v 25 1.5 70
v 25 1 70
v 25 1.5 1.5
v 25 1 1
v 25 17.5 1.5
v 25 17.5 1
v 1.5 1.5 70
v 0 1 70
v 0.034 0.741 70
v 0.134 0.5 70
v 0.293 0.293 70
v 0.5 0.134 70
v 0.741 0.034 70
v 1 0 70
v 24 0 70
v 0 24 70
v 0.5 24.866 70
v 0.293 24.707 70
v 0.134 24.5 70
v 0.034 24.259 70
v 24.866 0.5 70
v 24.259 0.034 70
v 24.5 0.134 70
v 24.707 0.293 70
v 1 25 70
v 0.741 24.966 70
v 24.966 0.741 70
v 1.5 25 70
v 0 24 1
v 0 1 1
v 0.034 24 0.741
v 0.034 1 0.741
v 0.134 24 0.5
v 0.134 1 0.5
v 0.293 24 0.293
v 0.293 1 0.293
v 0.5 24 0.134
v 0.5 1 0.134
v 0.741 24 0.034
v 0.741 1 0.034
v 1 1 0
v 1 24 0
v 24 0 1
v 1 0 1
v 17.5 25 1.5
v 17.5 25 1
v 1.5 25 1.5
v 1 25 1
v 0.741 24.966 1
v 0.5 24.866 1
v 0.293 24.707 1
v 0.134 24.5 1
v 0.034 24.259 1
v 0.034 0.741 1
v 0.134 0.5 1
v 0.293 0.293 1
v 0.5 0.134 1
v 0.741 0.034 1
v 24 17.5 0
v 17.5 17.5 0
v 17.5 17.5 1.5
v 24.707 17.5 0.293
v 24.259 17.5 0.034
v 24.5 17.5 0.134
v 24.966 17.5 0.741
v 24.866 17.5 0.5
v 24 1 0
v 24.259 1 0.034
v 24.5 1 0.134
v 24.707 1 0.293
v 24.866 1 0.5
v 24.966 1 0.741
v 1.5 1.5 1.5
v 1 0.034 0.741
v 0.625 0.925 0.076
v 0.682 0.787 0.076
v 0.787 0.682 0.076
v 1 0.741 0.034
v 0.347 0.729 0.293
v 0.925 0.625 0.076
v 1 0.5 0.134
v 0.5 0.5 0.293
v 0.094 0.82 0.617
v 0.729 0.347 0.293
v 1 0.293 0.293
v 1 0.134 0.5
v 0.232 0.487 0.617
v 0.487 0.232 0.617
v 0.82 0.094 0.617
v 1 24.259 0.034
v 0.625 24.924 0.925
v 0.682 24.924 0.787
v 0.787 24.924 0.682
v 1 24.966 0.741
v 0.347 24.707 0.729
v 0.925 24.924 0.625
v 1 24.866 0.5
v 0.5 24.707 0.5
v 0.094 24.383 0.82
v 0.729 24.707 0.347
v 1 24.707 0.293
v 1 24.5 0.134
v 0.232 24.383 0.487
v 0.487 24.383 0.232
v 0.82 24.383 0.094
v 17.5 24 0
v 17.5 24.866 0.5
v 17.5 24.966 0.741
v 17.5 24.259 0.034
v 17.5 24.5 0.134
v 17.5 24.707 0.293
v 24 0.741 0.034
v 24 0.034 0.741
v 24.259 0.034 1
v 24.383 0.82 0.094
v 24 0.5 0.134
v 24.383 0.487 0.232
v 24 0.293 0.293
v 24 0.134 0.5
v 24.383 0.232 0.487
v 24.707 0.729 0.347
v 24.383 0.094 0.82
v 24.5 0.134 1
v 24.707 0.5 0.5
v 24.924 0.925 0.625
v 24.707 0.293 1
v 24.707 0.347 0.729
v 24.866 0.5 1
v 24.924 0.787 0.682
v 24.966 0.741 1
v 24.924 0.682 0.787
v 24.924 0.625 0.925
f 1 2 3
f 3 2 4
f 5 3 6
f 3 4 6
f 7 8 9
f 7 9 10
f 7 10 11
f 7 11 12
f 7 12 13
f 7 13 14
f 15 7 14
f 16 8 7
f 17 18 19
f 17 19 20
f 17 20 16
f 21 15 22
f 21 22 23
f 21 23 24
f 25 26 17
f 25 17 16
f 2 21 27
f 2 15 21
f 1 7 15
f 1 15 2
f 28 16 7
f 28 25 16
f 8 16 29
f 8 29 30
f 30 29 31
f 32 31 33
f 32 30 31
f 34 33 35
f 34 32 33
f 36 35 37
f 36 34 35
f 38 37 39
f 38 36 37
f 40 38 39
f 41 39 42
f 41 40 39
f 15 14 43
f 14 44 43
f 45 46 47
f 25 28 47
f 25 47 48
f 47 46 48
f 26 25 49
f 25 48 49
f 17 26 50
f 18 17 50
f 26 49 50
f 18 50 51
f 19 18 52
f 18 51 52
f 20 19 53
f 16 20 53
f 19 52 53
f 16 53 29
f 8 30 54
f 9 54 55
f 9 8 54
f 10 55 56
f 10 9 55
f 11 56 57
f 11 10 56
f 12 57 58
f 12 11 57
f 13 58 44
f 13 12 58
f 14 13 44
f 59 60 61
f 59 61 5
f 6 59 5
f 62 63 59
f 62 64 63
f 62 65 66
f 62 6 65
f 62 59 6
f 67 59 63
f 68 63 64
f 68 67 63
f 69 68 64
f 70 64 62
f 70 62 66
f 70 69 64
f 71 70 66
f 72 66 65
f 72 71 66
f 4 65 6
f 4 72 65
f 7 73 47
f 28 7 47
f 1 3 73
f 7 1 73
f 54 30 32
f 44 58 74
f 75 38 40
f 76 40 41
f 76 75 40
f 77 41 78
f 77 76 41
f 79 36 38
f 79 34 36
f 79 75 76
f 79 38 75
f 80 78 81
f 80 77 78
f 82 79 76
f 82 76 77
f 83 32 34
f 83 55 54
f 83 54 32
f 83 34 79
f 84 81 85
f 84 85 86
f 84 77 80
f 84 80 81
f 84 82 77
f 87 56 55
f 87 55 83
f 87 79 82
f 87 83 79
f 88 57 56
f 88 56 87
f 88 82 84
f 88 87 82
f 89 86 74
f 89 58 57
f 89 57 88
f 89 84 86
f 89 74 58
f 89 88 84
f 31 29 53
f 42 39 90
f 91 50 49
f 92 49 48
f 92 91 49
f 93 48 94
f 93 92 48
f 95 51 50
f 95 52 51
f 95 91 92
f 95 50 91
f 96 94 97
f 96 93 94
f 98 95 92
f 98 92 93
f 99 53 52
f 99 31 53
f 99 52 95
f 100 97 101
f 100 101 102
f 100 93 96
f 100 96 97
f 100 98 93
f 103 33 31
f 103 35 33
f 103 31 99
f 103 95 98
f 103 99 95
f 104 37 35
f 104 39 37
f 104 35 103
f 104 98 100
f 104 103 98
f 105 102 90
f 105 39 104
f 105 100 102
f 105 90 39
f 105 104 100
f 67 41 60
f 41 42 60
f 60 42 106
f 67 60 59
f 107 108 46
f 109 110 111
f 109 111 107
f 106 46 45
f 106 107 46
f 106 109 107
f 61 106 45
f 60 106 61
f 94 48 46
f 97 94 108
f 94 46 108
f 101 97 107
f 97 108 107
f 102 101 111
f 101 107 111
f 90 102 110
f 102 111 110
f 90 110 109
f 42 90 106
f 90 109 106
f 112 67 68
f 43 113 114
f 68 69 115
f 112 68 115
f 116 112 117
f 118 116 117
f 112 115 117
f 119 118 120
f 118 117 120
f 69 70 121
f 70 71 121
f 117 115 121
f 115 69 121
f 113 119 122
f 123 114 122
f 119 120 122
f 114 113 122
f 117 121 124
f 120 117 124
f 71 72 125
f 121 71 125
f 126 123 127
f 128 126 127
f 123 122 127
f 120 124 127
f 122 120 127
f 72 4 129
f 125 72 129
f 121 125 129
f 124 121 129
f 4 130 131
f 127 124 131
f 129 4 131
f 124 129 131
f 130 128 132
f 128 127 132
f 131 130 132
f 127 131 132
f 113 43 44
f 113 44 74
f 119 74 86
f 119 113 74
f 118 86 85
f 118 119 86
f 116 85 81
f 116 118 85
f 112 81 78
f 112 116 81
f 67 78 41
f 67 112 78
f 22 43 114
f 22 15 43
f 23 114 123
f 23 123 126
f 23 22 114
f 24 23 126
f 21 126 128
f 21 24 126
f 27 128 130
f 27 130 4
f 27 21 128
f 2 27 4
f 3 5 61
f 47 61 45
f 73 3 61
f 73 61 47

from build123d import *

# Parameters (mm, degrees)
F1_DEPTH = 70
F3_DEPTH = 25
F4_R     = 1
F5_R     = 1
F6_W     = 24.6687295064
F6_H     = 11.3869960284
F7_DEPTH = 5


with BuildPart() as f1:
    # F0 (on Top) → F1 (new body)
    with BuildSketch(Plane.XY):
        Polygon((0, 25), (0, 0), (25, 0), (25, 1.5), (1.5, 1.5), (1.5, 25), align=None)
    extrude(amount=F1_DEPTH)

    # F2 (on Front) → F3 (join)
    with BuildSketch(Plane.XZ):
        Polygon((0, 25), (0, 0), (25, 0), (25, 1.5), (1.5, 1.5), (1.5, 25), align=None)
    extrude(amount=-F3_DEPTH)

    # F4
    f4_edges = [f1.edges().sort_by_distance(p)[0] for p in [
        (0, 0, 35),
        (0, 12.5, 0),
        (12.5, 0, 0),
    ]]
    fillet(f4_edges, radius=F4_R)

    # F5
    f5_edges = [f1.edges().sort_by_distance(p)[0] for p in [
        (25, 13, 0),
        (13, 25, 0),
        (25, 25, 0.75),
    ]]
    fillet(f5_edges, radius=F5_R)

    # F6 (on face) → F7 (cut)
    with BuildSketch(Plane(origin=(0, 0, 0), x_dir=(1, 0, 0), z_dir=(0, 0, -1))):
        with Locations((29.8343647532, -23.1934980142)):
            Rectangle(F6_W, F6_H)
    extrude(amount=-F7_DEPTH, mode=Mode.SUBTRACT)


solid = f1.part
